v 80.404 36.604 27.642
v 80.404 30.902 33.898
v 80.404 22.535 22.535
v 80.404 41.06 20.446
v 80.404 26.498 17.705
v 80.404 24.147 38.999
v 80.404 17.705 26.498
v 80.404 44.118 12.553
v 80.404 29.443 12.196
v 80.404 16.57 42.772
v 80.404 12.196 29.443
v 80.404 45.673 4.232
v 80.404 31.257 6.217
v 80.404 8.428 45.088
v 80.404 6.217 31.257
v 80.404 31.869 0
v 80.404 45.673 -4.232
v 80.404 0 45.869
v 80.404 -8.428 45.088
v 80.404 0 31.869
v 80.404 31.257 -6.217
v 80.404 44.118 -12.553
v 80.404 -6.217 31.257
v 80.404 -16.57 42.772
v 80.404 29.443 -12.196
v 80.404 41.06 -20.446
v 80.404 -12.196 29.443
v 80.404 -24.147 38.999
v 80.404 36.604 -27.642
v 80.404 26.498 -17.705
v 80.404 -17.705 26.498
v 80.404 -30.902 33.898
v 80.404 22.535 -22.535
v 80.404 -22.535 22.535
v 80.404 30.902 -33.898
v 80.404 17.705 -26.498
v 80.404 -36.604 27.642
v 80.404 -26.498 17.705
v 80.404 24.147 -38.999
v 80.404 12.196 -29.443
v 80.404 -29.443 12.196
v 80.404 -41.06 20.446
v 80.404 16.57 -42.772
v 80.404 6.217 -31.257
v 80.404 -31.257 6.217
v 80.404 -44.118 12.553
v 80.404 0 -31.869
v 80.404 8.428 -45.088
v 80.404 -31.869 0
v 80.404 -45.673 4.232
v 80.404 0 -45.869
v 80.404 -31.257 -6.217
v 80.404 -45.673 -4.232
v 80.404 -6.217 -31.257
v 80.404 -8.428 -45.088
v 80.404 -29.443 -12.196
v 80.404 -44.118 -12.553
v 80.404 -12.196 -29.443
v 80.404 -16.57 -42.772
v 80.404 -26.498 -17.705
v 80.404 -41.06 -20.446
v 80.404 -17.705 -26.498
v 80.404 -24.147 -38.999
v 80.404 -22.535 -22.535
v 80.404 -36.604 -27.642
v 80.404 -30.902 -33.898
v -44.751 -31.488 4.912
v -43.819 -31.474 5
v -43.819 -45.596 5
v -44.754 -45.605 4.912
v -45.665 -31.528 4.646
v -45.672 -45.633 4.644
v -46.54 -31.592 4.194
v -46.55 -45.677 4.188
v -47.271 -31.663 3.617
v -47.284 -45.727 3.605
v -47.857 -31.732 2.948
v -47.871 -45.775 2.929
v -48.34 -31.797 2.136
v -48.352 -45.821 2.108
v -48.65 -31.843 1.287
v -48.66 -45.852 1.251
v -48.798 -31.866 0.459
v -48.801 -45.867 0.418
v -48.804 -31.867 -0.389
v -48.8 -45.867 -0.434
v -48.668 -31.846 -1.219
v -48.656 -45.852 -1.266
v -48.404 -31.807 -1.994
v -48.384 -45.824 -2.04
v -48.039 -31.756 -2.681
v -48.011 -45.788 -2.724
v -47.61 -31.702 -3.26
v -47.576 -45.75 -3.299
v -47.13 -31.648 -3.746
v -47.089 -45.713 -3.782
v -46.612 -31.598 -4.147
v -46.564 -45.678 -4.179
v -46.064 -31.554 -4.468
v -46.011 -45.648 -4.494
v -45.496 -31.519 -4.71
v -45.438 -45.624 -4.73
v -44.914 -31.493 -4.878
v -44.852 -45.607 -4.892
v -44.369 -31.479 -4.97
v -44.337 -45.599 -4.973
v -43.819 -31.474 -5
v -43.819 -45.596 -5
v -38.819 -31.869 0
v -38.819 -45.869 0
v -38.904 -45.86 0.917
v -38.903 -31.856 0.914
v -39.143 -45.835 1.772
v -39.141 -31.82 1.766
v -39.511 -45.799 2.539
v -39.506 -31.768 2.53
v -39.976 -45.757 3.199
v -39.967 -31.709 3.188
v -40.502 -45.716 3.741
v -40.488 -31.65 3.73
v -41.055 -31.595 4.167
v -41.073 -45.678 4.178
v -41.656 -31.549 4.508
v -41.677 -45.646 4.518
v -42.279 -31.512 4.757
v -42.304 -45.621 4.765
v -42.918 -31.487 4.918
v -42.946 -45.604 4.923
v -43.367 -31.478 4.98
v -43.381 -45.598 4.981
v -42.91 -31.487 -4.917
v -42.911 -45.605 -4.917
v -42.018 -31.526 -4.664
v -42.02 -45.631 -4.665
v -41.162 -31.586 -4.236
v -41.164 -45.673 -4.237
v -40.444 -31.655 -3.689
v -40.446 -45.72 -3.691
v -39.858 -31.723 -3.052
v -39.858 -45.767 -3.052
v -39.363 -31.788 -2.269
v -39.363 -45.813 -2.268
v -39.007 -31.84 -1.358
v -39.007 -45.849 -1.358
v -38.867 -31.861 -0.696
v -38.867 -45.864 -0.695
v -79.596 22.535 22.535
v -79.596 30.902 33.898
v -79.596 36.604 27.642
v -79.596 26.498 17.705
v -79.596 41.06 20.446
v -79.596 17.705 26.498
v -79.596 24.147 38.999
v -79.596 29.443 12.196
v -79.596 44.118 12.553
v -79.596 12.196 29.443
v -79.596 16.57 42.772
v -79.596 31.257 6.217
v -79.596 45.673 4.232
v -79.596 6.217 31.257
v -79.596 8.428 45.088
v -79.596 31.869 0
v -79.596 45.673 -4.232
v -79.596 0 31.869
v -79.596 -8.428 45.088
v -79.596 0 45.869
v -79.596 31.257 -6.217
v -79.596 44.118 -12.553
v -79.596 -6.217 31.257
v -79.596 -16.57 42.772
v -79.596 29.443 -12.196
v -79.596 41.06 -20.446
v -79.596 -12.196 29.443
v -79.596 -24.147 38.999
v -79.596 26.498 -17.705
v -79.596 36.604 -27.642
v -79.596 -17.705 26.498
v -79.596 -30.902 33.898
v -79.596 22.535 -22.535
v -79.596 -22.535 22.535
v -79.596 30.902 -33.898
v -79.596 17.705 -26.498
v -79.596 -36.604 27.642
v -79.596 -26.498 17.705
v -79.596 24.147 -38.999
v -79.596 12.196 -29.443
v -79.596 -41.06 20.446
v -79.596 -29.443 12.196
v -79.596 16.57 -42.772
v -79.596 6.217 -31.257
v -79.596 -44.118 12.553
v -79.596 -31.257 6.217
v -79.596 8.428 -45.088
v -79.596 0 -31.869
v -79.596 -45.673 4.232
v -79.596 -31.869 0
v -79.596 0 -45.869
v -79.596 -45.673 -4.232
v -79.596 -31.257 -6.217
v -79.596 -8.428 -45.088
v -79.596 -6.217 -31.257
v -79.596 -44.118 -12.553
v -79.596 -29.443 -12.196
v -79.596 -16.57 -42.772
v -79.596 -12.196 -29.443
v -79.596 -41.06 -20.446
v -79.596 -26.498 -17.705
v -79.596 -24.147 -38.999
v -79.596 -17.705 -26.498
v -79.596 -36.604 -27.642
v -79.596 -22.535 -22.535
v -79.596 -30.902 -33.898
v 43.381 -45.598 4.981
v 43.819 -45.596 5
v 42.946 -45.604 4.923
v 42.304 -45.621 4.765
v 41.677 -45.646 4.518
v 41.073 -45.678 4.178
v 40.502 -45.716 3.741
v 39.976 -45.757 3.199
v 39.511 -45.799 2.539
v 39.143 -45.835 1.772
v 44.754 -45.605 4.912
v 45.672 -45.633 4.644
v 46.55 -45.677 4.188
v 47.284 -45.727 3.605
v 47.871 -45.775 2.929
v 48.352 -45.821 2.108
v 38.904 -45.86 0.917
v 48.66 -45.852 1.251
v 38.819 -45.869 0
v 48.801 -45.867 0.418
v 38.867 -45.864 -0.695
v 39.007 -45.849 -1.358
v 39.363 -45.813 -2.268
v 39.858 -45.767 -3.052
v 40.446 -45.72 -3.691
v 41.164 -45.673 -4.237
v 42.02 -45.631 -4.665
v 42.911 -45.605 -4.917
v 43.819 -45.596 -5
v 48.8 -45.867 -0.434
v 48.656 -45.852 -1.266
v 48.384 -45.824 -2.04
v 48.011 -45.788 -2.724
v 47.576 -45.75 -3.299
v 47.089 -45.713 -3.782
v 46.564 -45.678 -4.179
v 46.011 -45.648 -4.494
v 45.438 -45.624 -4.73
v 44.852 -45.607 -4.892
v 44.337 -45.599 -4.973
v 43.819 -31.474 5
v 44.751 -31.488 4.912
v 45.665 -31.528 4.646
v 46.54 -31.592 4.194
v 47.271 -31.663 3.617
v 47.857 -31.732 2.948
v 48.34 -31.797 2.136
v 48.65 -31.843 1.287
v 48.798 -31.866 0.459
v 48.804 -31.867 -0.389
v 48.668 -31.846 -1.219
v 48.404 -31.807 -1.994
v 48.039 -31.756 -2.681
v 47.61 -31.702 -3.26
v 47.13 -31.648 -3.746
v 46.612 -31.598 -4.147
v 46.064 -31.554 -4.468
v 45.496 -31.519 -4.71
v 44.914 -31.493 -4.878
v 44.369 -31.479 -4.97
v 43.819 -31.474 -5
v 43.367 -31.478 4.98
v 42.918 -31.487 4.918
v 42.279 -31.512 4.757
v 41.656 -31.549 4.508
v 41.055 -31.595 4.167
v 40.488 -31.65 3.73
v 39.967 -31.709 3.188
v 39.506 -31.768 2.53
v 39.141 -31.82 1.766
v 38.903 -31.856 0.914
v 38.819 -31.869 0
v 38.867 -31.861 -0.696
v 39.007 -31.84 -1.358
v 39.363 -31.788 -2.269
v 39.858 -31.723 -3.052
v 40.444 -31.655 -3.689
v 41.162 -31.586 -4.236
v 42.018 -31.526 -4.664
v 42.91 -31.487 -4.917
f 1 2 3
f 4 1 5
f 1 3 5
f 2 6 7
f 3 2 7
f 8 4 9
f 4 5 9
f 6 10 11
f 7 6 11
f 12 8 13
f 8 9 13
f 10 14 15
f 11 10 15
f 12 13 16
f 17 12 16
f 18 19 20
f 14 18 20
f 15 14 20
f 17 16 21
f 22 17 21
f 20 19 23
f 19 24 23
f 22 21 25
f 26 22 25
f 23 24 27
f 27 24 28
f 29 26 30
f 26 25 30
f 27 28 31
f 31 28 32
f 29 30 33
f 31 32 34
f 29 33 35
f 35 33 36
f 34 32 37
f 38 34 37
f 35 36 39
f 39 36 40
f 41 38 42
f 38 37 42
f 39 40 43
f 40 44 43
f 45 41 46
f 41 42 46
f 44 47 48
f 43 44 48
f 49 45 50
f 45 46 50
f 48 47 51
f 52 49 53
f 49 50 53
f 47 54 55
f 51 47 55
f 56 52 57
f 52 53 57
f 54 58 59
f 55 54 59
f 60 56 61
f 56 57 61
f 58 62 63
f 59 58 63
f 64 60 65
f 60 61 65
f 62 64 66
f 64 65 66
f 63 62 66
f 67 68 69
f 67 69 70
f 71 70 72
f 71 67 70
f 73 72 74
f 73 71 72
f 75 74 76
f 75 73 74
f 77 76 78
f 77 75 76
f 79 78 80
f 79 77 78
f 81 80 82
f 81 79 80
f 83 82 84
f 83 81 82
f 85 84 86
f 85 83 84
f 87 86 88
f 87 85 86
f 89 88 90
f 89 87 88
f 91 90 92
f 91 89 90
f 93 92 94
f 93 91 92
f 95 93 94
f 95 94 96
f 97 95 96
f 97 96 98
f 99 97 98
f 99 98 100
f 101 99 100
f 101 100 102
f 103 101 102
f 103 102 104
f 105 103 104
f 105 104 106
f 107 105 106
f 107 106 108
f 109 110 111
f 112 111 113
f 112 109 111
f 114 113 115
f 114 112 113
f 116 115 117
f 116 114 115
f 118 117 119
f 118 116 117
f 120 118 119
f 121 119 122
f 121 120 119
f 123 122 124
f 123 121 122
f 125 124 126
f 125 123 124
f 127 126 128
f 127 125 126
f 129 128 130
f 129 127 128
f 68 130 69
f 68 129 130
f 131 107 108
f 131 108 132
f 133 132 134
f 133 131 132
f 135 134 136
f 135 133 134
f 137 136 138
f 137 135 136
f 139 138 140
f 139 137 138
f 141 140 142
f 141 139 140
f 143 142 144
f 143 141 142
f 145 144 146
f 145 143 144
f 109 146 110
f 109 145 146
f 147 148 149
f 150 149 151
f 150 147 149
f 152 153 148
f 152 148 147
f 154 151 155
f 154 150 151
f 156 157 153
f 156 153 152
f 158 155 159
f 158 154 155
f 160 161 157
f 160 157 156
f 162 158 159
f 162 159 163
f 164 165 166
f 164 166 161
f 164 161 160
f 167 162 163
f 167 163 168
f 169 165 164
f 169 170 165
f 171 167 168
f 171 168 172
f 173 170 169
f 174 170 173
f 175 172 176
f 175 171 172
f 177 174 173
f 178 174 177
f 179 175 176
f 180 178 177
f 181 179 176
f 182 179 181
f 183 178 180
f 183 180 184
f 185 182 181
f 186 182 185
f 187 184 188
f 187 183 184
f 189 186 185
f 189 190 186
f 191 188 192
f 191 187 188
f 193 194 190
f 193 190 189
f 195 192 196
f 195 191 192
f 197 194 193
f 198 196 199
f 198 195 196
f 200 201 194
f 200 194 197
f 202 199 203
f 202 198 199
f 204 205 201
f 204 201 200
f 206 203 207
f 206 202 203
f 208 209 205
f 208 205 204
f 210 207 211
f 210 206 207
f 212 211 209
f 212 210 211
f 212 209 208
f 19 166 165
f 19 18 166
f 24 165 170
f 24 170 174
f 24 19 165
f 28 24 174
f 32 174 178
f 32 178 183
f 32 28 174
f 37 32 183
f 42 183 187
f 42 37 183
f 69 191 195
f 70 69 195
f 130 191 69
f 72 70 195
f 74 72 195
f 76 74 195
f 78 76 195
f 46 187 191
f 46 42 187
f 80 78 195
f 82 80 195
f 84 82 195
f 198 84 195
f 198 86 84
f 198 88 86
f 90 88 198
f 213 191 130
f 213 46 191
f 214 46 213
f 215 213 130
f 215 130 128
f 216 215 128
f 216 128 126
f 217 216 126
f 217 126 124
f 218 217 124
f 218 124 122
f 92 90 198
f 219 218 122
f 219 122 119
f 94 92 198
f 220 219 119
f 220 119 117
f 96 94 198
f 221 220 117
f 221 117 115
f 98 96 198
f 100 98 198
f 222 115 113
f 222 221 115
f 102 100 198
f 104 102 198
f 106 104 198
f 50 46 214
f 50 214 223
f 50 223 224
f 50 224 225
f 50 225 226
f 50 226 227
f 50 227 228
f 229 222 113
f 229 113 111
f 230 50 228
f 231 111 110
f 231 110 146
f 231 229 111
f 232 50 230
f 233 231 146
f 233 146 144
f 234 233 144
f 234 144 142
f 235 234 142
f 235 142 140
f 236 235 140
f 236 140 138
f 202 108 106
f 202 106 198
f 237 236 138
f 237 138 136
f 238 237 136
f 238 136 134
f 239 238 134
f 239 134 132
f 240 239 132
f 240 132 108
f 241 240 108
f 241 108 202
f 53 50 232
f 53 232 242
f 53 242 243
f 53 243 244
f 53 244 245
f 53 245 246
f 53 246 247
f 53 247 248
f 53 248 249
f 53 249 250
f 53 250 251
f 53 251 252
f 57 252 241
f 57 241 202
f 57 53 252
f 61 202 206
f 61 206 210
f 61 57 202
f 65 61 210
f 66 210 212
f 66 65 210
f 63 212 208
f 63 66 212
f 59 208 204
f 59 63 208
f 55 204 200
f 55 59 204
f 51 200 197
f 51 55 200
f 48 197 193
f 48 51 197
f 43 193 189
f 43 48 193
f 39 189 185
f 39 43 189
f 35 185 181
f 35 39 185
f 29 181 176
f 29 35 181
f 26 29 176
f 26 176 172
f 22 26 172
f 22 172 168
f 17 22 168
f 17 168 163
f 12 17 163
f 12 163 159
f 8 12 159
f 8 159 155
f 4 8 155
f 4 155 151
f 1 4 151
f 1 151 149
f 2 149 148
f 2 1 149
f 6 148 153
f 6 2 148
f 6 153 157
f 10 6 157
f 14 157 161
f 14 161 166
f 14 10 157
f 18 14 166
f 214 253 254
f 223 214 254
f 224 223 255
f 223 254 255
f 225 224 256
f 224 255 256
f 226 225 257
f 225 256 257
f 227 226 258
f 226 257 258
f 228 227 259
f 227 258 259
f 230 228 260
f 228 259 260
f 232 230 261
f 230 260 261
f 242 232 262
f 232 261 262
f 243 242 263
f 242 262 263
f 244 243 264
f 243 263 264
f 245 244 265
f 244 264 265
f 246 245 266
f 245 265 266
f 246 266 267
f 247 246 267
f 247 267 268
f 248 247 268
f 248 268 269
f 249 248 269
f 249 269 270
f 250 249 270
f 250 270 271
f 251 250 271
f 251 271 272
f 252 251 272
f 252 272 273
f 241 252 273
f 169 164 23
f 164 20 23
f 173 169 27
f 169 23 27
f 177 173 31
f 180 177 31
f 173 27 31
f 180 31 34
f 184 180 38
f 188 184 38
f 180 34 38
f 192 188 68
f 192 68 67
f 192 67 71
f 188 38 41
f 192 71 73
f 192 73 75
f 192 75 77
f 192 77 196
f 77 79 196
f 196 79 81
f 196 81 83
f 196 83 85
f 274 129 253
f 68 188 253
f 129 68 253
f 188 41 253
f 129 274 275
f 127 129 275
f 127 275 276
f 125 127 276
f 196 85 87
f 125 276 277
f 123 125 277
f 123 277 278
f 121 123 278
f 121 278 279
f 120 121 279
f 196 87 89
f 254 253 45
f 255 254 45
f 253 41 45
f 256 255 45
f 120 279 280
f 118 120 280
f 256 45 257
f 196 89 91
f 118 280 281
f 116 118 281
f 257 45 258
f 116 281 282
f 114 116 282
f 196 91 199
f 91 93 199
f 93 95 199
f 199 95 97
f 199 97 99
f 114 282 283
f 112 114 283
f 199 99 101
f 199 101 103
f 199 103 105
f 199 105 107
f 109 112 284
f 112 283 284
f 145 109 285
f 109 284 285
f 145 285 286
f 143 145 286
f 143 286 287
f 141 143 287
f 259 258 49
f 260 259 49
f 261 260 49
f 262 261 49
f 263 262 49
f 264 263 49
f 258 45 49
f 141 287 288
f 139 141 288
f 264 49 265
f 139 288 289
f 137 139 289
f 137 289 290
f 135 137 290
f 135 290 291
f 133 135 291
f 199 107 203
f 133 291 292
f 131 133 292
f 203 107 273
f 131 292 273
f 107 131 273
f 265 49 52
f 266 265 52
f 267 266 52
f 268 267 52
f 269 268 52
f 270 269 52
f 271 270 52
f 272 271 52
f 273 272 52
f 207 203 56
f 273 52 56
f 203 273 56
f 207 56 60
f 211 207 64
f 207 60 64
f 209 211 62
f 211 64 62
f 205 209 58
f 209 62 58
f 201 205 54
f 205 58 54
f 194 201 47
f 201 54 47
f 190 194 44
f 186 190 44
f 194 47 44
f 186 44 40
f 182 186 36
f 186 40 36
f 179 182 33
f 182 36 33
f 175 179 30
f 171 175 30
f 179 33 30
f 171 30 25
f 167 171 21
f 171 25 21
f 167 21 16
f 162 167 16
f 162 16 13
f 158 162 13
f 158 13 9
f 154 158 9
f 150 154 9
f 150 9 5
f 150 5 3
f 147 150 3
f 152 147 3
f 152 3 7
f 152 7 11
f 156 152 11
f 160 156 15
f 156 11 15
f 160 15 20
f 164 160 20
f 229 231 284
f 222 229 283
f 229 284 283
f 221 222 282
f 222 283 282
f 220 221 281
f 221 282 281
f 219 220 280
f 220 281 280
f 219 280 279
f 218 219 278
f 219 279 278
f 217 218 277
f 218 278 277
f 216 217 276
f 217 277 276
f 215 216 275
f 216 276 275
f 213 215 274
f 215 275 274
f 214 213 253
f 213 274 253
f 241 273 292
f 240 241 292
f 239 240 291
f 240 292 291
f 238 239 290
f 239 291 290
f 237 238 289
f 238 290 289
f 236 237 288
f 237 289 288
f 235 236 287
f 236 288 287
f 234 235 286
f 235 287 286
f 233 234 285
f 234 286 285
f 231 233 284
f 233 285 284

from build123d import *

# Parameters (mm, degrees)
F0_W     = 160
F0_H     = 14
F3_DEPTH = 45.8700225313


# Not quite as in the source:
# - the program builds the solid bodies; features that only make, move or delete a surface that nothing else refers to are left out


with BuildPart() as f1:
    # F0 (on Front) → F1 (revolve)
    with BuildSketch(Plane.XZ):
        with Locations((0.4038456827, 38.8690225313)):
            Rectangle(F0_W, F0_H)
    revolve(axis=Axis((59.6884675324, 0, 0), (1, 0, 0)))

    # F2 (on Front) → F3 (cut, through all)
    with BuildSketch(Plane.XZ):
        with BuildLine():
            ThreePointArc((-38.8187138988, 0), (-40.2831799929, 3.5355339059), (-43.8187138988, 5))
            Line((-43.8187138988, 5), (-43.8187138988, -5))
            ThreePointArc((-43.8187138988, -5), (-40.2831799929, -3.5355339059), (-38.8187138988, 0))
        make_face()
        with BuildLine():
            Line((-43.8187138988, -5), (-43.8187138988, 5))
            ThreePointArc((-43.8187138988, 5), (-48.8187138988, 0), (-43.8187138988, -5))
        make_face()
    f3 = extrude(amount=F3_DEPTH, mode=Mode.SUBTRACT)

    # F4: F3 across plane
    add(f3.mirror(Plane.YZ), mode=Mode.SUBTRACT)


solid = f1.part
